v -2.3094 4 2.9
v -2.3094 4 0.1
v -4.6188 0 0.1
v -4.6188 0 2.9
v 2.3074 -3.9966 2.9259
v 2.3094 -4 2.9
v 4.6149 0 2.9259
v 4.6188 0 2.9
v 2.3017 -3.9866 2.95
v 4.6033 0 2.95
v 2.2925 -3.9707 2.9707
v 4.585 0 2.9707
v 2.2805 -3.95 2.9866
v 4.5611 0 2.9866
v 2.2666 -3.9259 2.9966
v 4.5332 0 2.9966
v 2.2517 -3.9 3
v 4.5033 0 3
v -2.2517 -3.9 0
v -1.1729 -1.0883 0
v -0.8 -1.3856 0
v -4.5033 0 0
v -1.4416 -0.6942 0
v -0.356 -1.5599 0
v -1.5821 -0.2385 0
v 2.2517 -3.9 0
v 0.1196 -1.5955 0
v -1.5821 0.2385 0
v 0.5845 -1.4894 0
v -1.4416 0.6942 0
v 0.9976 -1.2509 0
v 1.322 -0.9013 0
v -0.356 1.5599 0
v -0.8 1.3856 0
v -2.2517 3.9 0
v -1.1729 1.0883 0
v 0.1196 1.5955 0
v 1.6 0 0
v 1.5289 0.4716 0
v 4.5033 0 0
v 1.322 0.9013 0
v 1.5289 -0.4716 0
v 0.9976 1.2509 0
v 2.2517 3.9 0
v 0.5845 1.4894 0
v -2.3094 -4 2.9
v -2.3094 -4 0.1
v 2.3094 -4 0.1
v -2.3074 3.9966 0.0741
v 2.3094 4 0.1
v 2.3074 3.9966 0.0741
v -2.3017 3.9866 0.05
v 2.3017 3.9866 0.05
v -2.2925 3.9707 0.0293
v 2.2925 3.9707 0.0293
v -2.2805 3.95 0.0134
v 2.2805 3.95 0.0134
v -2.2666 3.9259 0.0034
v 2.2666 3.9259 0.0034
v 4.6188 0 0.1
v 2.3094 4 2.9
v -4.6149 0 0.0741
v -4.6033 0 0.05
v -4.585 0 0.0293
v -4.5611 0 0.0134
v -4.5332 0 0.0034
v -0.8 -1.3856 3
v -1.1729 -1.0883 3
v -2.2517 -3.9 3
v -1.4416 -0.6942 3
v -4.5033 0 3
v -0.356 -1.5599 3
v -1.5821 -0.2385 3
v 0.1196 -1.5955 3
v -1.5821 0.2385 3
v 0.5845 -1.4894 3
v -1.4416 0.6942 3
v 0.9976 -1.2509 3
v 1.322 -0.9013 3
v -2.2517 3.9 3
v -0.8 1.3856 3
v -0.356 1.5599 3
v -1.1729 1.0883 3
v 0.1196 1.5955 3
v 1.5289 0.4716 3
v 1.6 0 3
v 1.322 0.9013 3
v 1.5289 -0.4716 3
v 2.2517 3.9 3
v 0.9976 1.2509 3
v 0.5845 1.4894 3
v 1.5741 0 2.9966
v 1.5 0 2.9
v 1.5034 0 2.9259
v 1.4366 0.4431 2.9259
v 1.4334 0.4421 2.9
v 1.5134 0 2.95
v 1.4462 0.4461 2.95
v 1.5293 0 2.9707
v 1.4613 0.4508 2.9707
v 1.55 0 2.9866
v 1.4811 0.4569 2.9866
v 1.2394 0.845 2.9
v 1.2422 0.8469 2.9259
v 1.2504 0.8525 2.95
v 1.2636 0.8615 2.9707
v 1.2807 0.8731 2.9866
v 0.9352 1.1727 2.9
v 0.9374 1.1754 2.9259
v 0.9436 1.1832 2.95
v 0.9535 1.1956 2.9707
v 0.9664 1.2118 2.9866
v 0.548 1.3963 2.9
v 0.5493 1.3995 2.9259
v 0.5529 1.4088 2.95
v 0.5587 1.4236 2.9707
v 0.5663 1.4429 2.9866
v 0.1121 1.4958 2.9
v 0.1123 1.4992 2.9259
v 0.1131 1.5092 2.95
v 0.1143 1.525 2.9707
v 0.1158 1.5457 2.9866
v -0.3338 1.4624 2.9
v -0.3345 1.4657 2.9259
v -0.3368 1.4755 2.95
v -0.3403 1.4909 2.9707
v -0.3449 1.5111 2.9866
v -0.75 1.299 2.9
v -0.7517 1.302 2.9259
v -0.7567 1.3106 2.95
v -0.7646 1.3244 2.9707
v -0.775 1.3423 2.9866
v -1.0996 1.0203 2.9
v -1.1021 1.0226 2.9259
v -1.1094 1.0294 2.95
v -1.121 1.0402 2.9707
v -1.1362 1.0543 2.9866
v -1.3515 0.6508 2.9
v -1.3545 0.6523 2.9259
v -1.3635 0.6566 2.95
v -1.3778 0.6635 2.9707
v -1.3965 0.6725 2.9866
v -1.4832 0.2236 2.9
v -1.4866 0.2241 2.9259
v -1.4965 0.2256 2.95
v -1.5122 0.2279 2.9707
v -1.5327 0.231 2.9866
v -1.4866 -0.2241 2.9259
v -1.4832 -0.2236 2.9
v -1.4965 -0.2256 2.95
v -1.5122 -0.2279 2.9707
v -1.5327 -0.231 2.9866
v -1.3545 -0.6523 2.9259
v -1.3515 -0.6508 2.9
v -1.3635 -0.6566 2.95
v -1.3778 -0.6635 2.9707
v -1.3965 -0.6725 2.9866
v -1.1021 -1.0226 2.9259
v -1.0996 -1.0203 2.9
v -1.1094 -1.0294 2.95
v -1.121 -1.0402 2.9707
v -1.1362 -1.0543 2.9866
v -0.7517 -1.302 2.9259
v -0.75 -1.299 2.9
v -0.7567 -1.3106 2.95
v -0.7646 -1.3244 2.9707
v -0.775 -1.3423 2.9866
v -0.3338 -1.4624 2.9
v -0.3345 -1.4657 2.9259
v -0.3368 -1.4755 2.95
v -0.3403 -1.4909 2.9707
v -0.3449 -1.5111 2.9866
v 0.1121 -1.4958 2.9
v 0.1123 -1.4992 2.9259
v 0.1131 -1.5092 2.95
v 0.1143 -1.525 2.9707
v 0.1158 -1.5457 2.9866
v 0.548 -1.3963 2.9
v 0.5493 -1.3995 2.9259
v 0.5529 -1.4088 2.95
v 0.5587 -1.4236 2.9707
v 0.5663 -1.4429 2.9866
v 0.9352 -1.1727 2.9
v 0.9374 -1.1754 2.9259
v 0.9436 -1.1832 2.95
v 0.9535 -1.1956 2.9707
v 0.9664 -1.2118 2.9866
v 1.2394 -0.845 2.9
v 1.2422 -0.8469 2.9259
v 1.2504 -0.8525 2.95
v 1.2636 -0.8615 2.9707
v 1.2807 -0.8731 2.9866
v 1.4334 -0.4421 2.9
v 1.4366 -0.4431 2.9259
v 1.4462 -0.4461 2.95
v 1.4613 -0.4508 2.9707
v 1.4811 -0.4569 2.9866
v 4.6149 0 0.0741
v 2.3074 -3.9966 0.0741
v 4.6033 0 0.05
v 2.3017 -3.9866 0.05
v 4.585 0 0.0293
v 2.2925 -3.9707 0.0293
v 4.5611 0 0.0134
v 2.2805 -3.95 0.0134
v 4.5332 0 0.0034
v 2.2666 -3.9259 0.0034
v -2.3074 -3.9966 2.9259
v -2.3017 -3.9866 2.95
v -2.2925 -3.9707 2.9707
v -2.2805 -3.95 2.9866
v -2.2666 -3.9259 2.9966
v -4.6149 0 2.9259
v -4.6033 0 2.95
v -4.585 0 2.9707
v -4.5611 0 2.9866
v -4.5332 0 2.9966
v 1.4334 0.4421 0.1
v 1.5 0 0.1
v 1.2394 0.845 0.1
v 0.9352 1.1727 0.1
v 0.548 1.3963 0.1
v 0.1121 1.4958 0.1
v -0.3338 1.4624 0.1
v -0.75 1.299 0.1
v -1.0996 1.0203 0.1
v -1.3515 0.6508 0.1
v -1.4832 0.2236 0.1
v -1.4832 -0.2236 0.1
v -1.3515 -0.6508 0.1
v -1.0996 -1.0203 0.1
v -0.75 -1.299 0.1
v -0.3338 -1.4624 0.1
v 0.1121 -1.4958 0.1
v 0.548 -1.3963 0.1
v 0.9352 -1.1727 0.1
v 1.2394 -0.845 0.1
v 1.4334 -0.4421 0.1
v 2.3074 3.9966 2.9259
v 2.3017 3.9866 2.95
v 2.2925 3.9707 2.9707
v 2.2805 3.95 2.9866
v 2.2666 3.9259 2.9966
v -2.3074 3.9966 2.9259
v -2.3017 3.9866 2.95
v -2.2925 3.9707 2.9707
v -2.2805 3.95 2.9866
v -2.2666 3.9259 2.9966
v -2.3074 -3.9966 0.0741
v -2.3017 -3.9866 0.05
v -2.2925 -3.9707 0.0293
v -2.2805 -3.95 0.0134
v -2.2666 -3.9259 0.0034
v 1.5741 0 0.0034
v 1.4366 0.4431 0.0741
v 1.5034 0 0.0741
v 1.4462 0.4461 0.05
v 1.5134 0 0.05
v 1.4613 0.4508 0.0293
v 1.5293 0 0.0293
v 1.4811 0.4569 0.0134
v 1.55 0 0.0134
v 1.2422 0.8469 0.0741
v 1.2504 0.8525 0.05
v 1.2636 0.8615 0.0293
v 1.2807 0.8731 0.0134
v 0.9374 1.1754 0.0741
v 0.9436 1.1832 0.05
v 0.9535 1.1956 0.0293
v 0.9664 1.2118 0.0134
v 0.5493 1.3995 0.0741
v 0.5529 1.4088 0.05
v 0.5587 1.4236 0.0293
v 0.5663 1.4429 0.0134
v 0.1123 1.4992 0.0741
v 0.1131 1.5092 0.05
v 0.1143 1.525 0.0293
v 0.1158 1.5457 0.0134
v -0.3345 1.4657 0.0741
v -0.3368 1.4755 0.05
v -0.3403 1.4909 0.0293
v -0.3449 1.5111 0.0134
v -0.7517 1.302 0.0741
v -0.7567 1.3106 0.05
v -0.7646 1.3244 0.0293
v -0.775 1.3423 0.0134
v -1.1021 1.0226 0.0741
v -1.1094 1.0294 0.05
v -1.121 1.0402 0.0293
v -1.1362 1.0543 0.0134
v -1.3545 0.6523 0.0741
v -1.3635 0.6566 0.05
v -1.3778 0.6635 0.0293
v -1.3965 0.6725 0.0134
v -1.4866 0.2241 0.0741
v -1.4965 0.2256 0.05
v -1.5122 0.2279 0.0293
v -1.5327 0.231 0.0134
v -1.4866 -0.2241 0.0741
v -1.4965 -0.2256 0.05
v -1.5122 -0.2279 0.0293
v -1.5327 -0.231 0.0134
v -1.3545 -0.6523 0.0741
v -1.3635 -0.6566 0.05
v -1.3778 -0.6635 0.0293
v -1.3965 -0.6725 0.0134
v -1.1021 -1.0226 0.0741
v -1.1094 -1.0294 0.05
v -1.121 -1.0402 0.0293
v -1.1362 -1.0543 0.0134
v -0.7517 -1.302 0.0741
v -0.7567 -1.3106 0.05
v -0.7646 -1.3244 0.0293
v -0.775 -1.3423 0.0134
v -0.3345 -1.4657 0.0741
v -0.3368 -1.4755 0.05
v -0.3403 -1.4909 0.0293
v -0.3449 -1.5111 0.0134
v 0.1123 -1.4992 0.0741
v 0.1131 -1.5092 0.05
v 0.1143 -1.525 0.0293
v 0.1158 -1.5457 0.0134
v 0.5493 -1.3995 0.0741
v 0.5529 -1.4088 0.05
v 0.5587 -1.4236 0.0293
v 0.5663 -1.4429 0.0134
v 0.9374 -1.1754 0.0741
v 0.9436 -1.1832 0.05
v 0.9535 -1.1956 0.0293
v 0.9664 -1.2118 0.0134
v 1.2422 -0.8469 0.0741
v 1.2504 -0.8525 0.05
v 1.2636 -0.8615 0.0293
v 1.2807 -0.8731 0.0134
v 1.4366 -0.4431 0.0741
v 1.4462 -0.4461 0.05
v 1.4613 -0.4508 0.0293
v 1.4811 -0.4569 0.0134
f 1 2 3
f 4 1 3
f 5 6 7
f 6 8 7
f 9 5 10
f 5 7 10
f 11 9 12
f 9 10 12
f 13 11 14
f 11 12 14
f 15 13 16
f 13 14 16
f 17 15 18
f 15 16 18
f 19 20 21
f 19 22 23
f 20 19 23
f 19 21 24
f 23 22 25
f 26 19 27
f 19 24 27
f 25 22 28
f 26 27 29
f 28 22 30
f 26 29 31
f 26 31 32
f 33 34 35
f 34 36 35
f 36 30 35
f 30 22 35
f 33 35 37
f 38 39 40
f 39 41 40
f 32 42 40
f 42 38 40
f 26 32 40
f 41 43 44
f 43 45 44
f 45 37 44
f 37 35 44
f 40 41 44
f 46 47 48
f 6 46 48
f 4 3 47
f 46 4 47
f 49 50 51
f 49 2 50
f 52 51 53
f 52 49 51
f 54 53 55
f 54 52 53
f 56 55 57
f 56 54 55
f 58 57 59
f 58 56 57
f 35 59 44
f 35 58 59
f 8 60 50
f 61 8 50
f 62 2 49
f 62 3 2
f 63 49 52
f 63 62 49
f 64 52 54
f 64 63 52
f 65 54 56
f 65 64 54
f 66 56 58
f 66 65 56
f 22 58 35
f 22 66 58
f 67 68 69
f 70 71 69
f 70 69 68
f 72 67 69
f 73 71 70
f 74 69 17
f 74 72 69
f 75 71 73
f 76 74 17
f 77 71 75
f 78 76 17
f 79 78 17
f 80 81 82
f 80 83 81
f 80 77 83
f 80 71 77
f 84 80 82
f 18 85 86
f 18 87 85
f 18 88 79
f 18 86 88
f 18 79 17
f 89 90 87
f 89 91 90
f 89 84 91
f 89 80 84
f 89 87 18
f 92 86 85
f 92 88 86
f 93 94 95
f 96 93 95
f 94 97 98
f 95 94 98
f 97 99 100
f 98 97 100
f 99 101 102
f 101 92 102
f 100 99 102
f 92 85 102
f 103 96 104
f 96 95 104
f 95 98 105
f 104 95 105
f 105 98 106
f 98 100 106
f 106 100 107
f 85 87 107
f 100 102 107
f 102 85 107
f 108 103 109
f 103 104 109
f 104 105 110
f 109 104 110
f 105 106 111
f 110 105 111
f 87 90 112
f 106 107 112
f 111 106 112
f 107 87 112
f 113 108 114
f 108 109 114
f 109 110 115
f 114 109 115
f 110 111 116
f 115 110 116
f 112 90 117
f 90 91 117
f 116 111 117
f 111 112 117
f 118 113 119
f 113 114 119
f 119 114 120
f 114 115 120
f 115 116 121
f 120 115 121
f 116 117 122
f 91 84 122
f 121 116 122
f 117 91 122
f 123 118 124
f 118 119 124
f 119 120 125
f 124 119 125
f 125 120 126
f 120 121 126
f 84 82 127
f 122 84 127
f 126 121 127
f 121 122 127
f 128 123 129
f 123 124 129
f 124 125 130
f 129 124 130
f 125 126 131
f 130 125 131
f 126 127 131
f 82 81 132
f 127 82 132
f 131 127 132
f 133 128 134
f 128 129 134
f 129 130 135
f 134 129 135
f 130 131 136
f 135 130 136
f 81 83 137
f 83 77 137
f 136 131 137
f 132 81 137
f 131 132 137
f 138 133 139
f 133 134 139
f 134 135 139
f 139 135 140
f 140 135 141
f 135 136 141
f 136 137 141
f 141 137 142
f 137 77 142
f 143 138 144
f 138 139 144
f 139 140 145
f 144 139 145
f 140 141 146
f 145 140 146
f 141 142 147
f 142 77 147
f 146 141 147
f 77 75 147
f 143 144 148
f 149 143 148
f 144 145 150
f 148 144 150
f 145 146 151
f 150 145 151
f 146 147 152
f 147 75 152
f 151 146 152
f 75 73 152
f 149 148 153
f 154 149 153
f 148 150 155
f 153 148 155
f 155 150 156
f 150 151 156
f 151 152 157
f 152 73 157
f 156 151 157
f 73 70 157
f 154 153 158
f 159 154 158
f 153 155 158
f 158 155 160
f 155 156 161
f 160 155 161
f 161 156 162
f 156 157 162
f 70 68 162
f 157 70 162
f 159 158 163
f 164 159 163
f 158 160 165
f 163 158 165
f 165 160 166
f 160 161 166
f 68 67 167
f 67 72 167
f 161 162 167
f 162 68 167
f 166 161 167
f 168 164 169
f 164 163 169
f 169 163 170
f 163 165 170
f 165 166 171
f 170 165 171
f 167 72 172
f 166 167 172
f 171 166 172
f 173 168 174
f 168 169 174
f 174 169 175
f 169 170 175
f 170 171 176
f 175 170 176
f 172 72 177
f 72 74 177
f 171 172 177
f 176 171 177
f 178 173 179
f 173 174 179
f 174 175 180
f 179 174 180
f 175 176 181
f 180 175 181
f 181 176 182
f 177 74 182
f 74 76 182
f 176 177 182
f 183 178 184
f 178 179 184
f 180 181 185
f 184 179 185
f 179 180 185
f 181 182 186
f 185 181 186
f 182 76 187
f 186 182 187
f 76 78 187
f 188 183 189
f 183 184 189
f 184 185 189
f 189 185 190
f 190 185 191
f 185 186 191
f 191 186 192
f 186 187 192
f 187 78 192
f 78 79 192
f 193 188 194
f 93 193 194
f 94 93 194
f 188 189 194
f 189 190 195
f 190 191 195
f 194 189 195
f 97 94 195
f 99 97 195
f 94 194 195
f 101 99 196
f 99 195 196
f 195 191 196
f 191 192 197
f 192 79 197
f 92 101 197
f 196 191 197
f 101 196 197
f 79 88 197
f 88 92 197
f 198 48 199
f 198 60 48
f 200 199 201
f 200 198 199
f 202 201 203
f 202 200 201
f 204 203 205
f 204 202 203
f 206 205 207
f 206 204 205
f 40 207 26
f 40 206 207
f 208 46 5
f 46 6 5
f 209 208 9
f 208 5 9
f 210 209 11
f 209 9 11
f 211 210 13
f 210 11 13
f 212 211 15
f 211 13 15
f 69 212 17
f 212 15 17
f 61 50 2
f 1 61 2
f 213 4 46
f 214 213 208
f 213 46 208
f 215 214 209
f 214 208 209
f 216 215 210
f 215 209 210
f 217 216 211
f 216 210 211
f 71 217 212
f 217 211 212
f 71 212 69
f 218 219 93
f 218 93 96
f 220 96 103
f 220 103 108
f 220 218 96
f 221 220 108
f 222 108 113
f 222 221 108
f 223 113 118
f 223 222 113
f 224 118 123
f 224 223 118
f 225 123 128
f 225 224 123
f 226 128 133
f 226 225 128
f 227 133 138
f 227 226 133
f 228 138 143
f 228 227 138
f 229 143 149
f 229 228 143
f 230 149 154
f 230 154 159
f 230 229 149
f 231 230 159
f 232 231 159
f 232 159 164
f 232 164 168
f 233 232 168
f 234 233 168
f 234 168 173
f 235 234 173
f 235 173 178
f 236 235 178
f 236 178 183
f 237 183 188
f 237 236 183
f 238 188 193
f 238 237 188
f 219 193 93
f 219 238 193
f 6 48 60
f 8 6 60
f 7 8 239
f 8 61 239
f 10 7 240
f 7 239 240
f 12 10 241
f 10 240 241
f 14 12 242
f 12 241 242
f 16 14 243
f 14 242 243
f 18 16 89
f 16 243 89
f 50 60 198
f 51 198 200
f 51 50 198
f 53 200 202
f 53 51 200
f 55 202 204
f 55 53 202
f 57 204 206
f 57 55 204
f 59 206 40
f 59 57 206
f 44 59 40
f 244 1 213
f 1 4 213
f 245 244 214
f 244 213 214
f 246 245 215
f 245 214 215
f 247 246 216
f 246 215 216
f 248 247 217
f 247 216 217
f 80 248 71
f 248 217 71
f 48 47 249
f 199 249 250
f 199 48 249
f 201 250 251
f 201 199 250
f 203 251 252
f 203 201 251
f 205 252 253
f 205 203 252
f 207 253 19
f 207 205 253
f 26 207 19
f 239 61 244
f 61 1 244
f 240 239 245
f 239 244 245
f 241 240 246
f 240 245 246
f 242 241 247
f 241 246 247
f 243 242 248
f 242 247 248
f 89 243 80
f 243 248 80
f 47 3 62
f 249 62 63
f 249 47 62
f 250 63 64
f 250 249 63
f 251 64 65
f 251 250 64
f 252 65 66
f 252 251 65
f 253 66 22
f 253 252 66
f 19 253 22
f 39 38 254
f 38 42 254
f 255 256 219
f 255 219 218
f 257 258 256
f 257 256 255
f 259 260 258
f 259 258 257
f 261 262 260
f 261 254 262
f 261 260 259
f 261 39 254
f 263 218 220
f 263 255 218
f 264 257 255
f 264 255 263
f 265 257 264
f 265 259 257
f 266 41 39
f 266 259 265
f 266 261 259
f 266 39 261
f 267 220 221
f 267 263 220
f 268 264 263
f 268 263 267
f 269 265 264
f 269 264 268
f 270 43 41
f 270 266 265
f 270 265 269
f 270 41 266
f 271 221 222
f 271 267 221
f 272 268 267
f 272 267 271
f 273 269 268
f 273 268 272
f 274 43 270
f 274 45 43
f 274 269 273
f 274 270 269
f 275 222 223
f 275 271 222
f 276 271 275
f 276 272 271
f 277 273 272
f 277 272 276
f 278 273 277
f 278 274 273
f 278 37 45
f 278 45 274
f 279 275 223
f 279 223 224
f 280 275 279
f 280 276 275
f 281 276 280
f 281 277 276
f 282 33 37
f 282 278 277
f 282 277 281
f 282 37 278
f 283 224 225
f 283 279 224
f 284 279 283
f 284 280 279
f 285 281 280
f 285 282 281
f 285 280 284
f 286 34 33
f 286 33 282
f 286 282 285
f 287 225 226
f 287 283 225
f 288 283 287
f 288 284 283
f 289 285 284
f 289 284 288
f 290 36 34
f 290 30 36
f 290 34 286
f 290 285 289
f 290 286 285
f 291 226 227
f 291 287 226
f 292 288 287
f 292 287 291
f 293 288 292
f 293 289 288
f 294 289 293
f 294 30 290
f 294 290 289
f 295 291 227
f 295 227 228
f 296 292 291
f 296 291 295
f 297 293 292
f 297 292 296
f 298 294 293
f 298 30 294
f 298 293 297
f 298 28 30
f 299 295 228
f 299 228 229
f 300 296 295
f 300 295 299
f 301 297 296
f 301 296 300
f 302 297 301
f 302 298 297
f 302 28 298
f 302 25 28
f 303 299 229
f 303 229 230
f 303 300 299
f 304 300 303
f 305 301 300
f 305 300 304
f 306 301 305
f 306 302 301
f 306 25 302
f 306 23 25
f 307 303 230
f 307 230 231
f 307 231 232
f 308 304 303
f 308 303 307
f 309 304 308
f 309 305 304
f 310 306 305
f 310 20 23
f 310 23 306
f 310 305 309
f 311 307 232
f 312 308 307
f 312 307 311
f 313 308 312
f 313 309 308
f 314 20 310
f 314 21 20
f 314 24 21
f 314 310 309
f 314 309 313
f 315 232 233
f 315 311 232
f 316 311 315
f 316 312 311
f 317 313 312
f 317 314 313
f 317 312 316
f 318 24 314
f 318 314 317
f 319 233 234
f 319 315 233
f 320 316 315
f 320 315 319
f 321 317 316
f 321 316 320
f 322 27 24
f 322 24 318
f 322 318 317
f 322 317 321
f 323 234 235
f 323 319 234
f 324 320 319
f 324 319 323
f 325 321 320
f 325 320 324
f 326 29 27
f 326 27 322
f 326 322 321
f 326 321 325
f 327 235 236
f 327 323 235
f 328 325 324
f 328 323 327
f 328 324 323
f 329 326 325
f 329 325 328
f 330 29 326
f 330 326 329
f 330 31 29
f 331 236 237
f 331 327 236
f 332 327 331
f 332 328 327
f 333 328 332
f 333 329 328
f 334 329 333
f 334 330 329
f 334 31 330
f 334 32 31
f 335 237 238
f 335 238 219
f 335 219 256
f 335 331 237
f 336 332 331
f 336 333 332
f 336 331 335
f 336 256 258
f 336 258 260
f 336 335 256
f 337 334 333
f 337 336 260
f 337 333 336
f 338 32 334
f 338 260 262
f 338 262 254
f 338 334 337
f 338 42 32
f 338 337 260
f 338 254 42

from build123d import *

# Parameters (mm, degrees)
SKIZZE1_R                       = 1.5
AUFSATZ_LINEAR_AUSTRAGEN1_DEPTH = 3
VERRUNDUNG1_R                   = 0.1


with BuildPart() as part:
    # Skizze1 → Aufsatz-Linear austragen1 (new body)
    with BuildSketch(Plane.XY):
        Polygon((-2.309401077, 4), (-4.618802154, 0), (-2.309401077, -4), (2.309401077, -4), (4.618802154, 0), (2.309401077, 4), align=None)
        Circle(SKIZZE1_R, mode=Mode.SUBTRACT)
    extrude(amount=AUFSATZ_LINEAR_AUSTRAGEN1_DEPTH)

    # Verrundung1
    verrundung1_edges = [part.edges().sort_by_distance(p)[0] for p in [
        (-3.464101615, -2, 3),
        (0, -4, 3),
        (3.464101615, -2, 3),
        (-1.5, 0, 0),
        (-1.5, 0, 3),
        (3.464101615, 2, 3),
        (0, 4, 3),
        (3.464101615, 2, 0),
        (3.464101615, -2, 0),
        (0, -4, 0),
        (-3.464101615, 2, 3),
        (-3.464101615, -2, 0),
        (-3.464101615, 2, 0),
        (0, 4, 0),
    ]]
    fillet(verrundung1_edges, radius=VERRUNDUNG1_R)


solid = part.part
